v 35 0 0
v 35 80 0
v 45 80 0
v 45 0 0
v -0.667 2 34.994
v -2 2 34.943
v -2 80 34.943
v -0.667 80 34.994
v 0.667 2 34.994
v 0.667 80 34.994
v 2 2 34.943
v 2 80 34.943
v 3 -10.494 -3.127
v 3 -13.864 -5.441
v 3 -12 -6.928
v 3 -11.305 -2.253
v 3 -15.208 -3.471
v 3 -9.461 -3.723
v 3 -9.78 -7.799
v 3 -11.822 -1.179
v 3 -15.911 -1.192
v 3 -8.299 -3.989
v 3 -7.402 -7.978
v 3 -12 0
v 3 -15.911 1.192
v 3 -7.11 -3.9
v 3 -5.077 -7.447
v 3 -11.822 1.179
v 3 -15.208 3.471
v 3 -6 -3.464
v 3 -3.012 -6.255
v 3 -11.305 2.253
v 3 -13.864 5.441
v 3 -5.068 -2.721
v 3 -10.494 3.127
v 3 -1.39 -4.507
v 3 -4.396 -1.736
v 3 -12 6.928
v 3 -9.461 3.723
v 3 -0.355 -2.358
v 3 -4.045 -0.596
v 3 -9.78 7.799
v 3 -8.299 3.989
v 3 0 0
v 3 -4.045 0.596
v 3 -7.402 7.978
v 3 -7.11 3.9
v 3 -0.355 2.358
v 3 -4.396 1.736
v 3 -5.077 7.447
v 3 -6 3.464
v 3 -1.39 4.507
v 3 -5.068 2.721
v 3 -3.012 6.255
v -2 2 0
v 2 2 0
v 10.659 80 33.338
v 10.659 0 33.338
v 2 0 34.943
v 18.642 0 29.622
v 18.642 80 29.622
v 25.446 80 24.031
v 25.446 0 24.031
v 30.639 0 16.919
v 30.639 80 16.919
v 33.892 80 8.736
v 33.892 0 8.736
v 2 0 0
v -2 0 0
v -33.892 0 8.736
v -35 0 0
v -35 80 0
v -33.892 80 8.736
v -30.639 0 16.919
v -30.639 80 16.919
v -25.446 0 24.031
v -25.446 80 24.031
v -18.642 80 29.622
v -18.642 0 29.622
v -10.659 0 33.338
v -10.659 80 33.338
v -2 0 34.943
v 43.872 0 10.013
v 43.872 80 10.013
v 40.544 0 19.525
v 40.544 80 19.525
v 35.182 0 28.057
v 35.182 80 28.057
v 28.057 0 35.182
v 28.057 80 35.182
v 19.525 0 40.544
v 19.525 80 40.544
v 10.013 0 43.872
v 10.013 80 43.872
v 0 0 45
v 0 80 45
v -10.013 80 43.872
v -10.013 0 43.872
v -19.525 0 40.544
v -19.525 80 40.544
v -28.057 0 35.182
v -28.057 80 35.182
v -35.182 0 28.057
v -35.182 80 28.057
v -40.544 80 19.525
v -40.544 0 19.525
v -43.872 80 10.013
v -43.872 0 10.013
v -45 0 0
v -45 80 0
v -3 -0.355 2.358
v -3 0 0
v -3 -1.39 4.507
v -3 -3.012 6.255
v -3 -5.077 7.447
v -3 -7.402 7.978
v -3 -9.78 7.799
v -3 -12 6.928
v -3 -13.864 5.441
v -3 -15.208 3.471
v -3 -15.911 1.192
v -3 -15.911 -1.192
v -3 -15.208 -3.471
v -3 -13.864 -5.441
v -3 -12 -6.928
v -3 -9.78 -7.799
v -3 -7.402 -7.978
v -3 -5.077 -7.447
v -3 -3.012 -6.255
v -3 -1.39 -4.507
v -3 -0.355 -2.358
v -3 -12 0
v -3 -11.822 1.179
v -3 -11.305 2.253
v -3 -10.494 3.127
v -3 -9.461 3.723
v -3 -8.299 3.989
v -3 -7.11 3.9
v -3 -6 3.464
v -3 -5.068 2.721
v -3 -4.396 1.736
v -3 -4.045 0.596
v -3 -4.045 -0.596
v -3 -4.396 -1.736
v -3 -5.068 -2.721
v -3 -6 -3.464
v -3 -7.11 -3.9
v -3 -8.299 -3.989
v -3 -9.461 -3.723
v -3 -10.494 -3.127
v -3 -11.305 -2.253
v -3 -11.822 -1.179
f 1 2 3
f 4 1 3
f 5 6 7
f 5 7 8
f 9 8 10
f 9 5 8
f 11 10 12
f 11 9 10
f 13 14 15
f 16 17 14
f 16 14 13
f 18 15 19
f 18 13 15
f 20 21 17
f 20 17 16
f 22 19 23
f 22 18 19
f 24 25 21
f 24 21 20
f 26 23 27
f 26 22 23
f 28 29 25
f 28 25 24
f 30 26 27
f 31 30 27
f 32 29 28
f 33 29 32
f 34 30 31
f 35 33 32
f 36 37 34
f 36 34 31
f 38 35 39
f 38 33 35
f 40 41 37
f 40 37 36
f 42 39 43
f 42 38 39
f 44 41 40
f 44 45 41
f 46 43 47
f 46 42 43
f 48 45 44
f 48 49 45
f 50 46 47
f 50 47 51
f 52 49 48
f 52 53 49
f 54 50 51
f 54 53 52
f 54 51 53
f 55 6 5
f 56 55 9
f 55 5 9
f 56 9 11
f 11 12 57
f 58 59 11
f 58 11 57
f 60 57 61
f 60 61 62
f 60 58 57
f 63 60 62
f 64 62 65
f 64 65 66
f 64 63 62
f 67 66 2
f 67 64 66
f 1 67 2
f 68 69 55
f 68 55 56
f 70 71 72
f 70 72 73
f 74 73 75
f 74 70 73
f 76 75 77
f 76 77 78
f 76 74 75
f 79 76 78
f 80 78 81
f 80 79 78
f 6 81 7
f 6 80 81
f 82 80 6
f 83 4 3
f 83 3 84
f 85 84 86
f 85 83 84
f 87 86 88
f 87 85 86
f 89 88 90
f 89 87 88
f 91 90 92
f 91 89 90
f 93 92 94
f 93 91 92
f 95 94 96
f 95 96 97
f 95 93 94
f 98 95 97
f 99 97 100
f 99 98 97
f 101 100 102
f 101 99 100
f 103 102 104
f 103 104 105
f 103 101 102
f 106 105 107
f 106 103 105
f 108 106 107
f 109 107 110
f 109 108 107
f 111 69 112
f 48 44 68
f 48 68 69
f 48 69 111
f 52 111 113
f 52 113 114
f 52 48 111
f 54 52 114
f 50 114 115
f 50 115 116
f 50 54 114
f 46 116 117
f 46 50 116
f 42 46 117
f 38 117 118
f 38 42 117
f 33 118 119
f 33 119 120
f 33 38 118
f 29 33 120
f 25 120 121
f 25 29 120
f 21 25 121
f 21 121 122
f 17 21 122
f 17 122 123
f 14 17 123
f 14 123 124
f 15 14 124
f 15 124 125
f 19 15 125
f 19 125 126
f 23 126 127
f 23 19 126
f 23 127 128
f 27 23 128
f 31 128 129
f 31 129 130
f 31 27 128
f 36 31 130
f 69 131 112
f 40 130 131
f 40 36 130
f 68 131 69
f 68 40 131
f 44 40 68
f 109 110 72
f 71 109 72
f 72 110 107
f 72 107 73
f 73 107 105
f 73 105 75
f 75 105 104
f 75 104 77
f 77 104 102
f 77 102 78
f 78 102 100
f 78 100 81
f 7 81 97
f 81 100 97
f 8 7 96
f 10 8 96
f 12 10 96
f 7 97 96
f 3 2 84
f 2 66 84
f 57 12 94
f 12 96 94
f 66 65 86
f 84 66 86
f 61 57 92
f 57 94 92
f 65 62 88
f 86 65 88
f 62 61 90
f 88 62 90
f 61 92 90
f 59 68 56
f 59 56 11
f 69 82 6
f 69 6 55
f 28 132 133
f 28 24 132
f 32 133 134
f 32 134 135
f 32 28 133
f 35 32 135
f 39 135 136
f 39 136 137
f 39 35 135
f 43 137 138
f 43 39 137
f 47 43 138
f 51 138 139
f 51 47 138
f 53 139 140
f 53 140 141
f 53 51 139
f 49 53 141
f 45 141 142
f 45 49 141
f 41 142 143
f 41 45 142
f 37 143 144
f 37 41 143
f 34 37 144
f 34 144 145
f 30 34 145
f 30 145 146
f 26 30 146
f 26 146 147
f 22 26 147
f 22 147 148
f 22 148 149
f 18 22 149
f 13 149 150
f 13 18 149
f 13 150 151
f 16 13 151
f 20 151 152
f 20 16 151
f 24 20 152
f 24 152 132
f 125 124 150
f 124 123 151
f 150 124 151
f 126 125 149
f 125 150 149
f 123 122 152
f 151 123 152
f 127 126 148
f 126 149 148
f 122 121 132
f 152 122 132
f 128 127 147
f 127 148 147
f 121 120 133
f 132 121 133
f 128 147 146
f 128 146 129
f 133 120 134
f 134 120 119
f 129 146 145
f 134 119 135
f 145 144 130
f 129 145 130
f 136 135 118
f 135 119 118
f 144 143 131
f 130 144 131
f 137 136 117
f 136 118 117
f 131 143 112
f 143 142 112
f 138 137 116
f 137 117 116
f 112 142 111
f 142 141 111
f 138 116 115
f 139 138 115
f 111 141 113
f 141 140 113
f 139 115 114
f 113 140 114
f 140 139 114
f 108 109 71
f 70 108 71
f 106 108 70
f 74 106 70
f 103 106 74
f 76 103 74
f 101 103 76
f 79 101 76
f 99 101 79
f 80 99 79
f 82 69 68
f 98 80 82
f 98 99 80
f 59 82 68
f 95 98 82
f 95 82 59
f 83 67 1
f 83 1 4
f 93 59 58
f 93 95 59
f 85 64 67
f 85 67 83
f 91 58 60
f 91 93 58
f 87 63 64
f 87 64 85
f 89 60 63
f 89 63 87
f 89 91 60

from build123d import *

# Parameters (mm, degrees)
F2_DEPTH = 3
F3_DEPTH = 80
F5_DEPTH = 2


with BuildPart() as f2:
    # F1 (on Right) → F2 (new body, symmetric)
    with BuildSketch(Plane.YZ):
        with BuildLine():
            ThreePointArc((-16, 0), (-8, -8), (0, 0))
            Line((0, 0), (-4, 0))
            ThreePointArc((-4, 0), (-8, -4), (-12, 0))
            Line((-12, 0), (-16, 0))
        make_face()
        with BuildLine():
            Line((-4, 0), (0, 0))
            ThreePointArc((0, 0), (-8, 8), (-16, 0))
            Line((-16, 0), (-12, 0))
            ThreePointArc((-12, 0), (-8, 4), (-4, 0))
        make_face()
    extrude(amount=F2_DEPTH, both=True)



with BuildPart() as f3:
    # F0 (on Front) → F3 (new body)
    with BuildSketch(Plane.XZ):
        with BuildLine():
            Line((35, 0), (45, 0))
            ThreePointArc((45, 0), (0, 45), (-45, 0))
            Line((-45, 0), (-35, 0))
            ThreePointArc((-35, 0), (-25.446021, 24.03123), (-2, 34.94281))
            ThreePointArc((-2, 34.94281), (0, 35), (2, 34.94281))
            ThreePointArc((2, 34.94281), (25.446021, 24.03123), (35, 0))
        make_face()
    extrude(amount=-F3_DEPTH)


with BuildPart() as f2_1:
    add(f2.part)

    add(f3.part)  # F5 merges F3
    # F4 (on Front) → F5 (join)
    with BuildSketch(Plane.XZ):
        with BuildLine():
            Line((2, 0), (2, 34.94281))
            ThreePointArc((2, 34.94281), (0, 35), (-2, 34.94281))
            Line((-2, 34.94281), (-2, 0))
            Line((-2, 0), (0, 0))
            Line((0, 0), (2, 0))
        make_face()
    extrude(amount=-F5_DEPTH)


solid = f2_1.part
